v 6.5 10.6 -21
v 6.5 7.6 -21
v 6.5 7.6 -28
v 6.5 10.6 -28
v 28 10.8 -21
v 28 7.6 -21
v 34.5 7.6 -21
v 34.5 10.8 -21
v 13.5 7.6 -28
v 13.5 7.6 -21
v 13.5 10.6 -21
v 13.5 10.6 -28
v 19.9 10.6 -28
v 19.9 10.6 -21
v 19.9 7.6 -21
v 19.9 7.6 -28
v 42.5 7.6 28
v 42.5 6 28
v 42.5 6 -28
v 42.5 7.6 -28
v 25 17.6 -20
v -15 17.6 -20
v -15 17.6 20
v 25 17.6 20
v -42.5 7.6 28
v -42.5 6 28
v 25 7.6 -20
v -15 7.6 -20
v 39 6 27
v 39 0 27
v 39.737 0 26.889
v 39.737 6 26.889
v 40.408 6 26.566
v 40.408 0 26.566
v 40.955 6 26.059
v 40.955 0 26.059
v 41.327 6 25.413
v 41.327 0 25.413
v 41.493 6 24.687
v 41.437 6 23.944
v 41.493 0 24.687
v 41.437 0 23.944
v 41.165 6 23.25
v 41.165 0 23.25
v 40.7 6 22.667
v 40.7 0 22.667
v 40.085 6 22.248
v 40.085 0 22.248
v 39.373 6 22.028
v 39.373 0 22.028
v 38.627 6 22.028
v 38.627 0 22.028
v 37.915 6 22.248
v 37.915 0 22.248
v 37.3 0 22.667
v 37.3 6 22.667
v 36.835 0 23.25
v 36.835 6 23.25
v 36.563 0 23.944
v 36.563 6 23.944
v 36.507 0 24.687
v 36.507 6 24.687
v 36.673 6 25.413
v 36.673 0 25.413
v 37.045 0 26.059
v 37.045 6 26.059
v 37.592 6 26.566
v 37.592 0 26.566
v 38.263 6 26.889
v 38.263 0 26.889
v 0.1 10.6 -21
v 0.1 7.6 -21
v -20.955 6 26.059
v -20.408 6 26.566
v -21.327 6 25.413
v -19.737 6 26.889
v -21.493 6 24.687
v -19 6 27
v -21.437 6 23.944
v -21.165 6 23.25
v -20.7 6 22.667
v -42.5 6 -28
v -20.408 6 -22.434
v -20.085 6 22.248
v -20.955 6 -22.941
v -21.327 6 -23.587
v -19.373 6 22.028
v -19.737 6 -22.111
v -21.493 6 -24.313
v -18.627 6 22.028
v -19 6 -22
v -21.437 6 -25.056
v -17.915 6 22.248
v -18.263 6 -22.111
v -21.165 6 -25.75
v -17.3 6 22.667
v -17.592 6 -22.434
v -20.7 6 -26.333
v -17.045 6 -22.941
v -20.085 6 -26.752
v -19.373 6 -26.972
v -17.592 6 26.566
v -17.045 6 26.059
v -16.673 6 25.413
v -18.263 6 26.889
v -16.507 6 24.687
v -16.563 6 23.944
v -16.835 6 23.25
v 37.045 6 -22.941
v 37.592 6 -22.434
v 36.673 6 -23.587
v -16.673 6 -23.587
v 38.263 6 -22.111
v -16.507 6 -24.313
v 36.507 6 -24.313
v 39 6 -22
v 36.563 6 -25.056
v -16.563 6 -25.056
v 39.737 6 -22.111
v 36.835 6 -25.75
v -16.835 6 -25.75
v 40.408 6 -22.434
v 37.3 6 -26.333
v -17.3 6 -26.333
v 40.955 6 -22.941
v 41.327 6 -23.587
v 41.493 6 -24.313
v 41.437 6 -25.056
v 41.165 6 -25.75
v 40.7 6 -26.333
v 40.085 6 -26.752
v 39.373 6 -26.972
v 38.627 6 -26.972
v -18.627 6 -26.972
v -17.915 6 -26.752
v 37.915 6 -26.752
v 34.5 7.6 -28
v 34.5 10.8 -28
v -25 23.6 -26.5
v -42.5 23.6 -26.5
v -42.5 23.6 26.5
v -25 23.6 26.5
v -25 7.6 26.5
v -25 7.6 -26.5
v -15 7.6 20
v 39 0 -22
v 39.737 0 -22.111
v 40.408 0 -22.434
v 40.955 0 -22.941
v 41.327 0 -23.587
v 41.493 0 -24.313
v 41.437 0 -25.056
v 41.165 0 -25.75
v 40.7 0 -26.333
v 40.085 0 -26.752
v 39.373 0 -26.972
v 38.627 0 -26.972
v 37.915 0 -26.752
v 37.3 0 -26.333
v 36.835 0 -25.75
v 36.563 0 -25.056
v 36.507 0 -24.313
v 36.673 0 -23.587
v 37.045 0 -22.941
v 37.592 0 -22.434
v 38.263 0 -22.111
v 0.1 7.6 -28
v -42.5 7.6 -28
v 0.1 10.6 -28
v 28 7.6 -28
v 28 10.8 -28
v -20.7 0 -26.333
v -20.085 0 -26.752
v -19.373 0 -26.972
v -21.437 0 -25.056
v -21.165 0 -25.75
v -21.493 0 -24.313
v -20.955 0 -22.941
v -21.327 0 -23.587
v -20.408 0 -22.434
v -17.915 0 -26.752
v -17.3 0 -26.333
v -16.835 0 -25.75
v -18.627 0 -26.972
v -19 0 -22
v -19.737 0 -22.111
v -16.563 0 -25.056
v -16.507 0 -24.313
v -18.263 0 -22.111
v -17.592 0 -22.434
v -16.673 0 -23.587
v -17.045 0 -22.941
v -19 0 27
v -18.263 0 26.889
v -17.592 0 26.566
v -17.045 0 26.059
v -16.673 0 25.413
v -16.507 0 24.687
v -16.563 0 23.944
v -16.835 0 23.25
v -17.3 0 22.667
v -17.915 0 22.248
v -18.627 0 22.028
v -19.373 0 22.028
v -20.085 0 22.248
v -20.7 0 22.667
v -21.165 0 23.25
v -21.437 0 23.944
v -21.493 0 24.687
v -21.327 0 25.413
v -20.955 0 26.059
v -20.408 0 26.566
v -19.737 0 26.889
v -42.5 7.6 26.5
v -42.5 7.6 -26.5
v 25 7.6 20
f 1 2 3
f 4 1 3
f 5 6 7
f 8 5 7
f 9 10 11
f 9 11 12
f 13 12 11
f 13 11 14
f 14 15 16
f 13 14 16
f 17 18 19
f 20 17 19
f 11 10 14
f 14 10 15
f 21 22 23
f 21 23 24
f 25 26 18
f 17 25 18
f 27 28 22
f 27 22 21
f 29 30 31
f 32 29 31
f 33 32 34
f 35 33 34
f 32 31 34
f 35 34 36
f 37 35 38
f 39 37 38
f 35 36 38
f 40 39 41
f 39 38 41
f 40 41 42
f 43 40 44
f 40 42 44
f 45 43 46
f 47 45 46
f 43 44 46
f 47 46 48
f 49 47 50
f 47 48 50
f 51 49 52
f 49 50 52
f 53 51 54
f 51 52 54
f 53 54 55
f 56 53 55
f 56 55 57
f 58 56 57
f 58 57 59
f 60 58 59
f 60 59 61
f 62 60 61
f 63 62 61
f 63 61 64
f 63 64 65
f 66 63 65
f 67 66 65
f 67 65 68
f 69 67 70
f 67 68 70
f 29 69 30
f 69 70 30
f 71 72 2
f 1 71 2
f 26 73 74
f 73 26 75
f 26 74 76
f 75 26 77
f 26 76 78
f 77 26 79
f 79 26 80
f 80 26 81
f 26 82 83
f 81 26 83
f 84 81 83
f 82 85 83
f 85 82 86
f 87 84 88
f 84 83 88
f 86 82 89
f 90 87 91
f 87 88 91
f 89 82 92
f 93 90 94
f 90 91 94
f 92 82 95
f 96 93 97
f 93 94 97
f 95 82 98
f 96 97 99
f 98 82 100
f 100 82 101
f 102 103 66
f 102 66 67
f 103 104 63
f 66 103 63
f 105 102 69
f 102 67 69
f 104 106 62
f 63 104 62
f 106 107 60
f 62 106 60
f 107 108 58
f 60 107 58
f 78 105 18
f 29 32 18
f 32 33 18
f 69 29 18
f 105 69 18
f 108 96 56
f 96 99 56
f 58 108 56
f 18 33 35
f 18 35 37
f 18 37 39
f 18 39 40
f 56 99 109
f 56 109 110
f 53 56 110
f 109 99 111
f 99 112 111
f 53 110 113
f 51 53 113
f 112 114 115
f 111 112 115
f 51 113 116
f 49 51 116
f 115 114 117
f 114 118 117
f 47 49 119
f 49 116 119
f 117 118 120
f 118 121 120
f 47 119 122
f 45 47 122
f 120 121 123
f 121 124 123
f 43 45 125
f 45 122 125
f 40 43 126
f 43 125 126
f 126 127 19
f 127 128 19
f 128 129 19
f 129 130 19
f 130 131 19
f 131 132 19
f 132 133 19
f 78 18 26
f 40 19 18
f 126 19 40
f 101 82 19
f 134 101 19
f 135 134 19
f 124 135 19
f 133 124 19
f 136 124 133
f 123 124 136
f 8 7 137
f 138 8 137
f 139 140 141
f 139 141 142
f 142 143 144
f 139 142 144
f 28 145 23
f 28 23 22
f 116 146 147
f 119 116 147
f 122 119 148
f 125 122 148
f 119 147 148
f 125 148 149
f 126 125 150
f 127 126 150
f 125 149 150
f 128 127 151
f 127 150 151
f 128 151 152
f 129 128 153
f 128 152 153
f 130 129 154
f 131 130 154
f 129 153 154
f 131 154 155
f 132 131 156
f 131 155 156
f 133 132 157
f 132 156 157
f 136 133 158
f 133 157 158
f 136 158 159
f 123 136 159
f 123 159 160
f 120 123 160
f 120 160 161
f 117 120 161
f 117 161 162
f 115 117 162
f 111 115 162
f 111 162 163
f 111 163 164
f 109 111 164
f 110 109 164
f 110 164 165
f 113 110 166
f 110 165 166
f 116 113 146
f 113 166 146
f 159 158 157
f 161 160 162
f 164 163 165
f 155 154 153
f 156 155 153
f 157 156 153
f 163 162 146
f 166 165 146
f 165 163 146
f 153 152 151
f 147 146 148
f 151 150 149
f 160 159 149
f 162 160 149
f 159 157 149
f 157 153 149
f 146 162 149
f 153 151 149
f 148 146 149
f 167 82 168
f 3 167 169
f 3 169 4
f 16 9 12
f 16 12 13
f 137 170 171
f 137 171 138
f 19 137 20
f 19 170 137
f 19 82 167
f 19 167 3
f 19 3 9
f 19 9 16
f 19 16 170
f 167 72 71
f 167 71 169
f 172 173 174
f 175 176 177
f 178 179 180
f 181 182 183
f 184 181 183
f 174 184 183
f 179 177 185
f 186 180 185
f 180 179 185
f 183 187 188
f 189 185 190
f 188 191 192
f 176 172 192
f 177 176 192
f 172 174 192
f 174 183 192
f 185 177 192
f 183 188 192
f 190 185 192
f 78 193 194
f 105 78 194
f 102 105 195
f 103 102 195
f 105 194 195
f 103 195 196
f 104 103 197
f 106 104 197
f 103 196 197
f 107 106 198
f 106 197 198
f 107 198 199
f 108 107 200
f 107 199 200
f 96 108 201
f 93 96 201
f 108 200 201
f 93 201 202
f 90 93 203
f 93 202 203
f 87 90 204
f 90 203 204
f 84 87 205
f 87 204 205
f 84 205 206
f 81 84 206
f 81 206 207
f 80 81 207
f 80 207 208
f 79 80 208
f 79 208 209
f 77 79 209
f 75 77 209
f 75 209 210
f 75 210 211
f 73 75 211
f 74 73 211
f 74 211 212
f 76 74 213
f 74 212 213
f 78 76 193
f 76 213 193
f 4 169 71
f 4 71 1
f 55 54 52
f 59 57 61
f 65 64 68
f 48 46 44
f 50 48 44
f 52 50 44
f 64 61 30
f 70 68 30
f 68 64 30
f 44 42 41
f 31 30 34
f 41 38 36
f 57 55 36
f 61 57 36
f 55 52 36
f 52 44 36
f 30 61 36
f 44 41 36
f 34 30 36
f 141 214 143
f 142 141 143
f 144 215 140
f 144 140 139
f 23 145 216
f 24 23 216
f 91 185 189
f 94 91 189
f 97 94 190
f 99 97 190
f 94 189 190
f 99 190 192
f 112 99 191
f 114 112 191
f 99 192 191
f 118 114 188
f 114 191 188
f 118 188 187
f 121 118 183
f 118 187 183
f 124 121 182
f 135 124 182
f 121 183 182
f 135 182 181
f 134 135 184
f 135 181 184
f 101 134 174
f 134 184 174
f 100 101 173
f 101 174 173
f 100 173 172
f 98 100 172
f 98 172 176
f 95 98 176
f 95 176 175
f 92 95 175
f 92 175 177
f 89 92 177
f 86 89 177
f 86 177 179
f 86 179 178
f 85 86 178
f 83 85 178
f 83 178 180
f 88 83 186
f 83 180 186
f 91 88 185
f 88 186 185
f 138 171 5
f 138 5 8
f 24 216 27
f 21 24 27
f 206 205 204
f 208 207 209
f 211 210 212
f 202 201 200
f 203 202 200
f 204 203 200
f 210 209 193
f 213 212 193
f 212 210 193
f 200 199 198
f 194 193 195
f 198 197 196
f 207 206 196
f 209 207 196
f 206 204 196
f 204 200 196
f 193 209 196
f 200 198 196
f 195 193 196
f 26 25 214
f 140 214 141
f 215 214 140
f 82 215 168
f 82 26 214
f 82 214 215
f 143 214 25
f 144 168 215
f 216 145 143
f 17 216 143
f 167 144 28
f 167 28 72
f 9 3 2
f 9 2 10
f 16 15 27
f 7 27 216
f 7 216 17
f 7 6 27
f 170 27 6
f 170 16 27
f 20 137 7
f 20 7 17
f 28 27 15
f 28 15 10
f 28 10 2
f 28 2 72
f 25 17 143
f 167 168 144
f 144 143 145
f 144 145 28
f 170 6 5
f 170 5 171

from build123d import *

# Parameters (mm, degrees)
SK_P01_STANDOFF_R        = 2.5
P01_STANDOFF_DEPTH       = 6
SK_P02_STANDOFF_R        = 2.5
P02_STANDOFF_DEPTH       = 6
SK_P03_STANDOFF_R        = 2.5
P03_STANDOFF_DEPTH       = 6
SK_P04_STANDOFF_R        = 2.5
P04_STANDOFF_DEPTH       = 6
P05_BOARD_START          = 6
SK_P05_BOARD_W           = 85
SK_P05_BOARD_H           = 56
P05_BOARD_DEPTH          = 1.6
P06_ACTIVECOOLER_START   = 7.6
SK_P06_ACTIVECOOLER_W    = 40
SK_P06_ACTIVECOOLER_H    = 40
P06_ACTIVECOOLER_DEPTH   = 10
P07_USBANDETHERNET_START = 7.6
SK_P07_USBANDETHERNET_W  = 17.5
SK_P07_USBANDETHERNET_H  = 53
P07_USBANDETHERNET_DEPTH = 16
P08_USBCPOWER_START      = 7.6
SK_P08_USBCPOWER_W       = 6.5
SK_P08_USBCPOWER_H       = 7
P08_USBCPOWER_DEPTH      = 3.2
P09_MICROHDMI0_START     = 7.6
SK_P09_MICROHDMI0_W      = 6.4
SK_P09_MICROHDMI0_H      = 7
P09_MICROHDMI0_DEPTH     = 3
P10_MICROHDMI1_START     = 7.6
SK_P10_MICROHDMI1_W      = 6.4
SK_P10_MICROHDMI1_H      = 7
P10_MICROHDMI1_DEPTH     = 3


with BuildPart() as part:
    # SK_P01_Standoff → P01_Standoff (new body)
    with BuildSketch(Plane(origin=(0, 0, 0), x_dir=(1, 0, 0), z_dir=(0, 1, 0))):
        with Locations(Location((-19, 24.5, 0), (0, 0, 270))):
            Circle(SK_P01_STANDOFF_R)
    extrude(amount=P01_STANDOFF_DEPTH)



with BuildPart() as body_2:
    # SK_P02_Standoff → P02_Standoff (new body)
    with BuildSketch(Plane(origin=(0, 0, 0), x_dir=(1, 0, 0), z_dir=(0, 1, 0))):
        with Locations(Location((-19, -24.5, 0), (0, 0, 270))):
            Circle(SK_P02_STANDOFF_R)
    extrude(amount=P02_STANDOFF_DEPTH)


with BuildPart() as body_3:
    # SK_P03_Standoff → P03_Standoff (new body)
    with BuildSketch(Plane(origin=(0, 0, 0), x_dir=(1, 0, 0), z_dir=(0, 1, 0))):
        with Locations(Location((39, 24.5, 0), (0, 0, 270))):
            Circle(SK_P03_STANDOFF_R)
    extrude(amount=P03_STANDOFF_DEPTH)


with BuildPart() as body_4:
    # SK_P04_Standoff → P04_Standoff (new body)
    with BuildSketch(Plane(origin=(0, 0, 0), x_dir=(1, 0, 0), z_dir=(0, 1, 0))):
        with Locations(Location((39, -24.5, 0), (0, 0, 270))):
            Circle(SK_P04_STANDOFF_R)
    extrude(amount=P04_STANDOFF_DEPTH)


with BuildPart() as part_1:
    add(part.part)

    add(body_2.part)  # P05_Board merges body 2

    add(body_3.part)  # P05_Board merges body 3

    add(body_4.part)  # P05_Board merges body 4
    # SK_P05_Board → P05_Board (add)
    with BuildSketch(Plane(origin=(0, 0, 0), x_dir=(1, 0, 0), z_dir=(0, 1, 0)).offset(P05_BOARD_START)):
        Rectangle(SK_P05_BOARD_W, SK_P05_BOARD_H)
    extrude(amount=P05_BOARD_DEPTH)

    # SK_P06_Activecooler → P06_Activecooler (add)
    with BuildSketch(Plane(origin=(0, 0, 0), x_dir=(1, 0, 0), z_dir=(0, 1, 0)).offset(P06_ACTIVECOOLER_START)):
        with Locations((5, 0)):
            Rectangle(SK_P06_ACTIVECOOLER_W, SK_P06_ACTIVECOOLER_H)
    extrude(amount=P06_ACTIVECOOLER_DEPTH)

    # SK_P07_USBandEthernet → P07_USBandEthernet (add)
    with BuildSketch(Plane(origin=(0, 0, 0), x_dir=(1, 0, 0), z_dir=(0, 1, 0)).offset(P07_USBANDETHERNET_START)):
        with Locations((-33.75, 0)):
            Rectangle(SK_P07_USBANDETHERNET_W, SK_P07_USBANDETHERNET_H)
    extrude(amount=P07_USBANDETHERNET_DEPTH)

    # SK_P08_USBCpower → P08_USBCpower (add)
    with BuildSketch(Plane(origin=(0, 0, 0), x_dir=(1, 0, 0), z_dir=(0, 1, 0)).offset(P08_USBCPOWER_START)):
        with Locations((31.25, 24.5)):
            Rectangle(SK_P08_USBCPOWER_W, SK_P08_USBCPOWER_H)
    extrude(amount=P08_USBCPOWER_DEPTH)

    # SK_P09_microHDMI0 → P09_microHDMI0 (add)
    with BuildSketch(Plane(origin=(0, 0, 0), x_dir=(1, 0, 0), z_dir=(0, 1, 0)).offset(P09_MICROHDMI0_START)):
        with Locations((16.7, 24.5)):
            Rectangle(SK_P09_MICROHDMI0_W, SK_P09_MICROHDMI0_H)
    extrude(amount=P09_MICROHDMI0_DEPTH)

    # SK_P10_microHDMI1 → P10_microHDMI1 (add)
    with BuildSketch(Plane(origin=(0, 0, 0), x_dir=(1, 0, 0), z_dir=(0, 1, 0)).offset(P10_MICROHDMI1_START)):
        with Locations((3.3, 24.5)):
            Rectangle(SK_P10_MICROHDMI1_W, SK_P10_MICROHDMI1_H)
    extrude(amount=P10_MICROHDMI1_DEPTH)


solid = part_1.part
